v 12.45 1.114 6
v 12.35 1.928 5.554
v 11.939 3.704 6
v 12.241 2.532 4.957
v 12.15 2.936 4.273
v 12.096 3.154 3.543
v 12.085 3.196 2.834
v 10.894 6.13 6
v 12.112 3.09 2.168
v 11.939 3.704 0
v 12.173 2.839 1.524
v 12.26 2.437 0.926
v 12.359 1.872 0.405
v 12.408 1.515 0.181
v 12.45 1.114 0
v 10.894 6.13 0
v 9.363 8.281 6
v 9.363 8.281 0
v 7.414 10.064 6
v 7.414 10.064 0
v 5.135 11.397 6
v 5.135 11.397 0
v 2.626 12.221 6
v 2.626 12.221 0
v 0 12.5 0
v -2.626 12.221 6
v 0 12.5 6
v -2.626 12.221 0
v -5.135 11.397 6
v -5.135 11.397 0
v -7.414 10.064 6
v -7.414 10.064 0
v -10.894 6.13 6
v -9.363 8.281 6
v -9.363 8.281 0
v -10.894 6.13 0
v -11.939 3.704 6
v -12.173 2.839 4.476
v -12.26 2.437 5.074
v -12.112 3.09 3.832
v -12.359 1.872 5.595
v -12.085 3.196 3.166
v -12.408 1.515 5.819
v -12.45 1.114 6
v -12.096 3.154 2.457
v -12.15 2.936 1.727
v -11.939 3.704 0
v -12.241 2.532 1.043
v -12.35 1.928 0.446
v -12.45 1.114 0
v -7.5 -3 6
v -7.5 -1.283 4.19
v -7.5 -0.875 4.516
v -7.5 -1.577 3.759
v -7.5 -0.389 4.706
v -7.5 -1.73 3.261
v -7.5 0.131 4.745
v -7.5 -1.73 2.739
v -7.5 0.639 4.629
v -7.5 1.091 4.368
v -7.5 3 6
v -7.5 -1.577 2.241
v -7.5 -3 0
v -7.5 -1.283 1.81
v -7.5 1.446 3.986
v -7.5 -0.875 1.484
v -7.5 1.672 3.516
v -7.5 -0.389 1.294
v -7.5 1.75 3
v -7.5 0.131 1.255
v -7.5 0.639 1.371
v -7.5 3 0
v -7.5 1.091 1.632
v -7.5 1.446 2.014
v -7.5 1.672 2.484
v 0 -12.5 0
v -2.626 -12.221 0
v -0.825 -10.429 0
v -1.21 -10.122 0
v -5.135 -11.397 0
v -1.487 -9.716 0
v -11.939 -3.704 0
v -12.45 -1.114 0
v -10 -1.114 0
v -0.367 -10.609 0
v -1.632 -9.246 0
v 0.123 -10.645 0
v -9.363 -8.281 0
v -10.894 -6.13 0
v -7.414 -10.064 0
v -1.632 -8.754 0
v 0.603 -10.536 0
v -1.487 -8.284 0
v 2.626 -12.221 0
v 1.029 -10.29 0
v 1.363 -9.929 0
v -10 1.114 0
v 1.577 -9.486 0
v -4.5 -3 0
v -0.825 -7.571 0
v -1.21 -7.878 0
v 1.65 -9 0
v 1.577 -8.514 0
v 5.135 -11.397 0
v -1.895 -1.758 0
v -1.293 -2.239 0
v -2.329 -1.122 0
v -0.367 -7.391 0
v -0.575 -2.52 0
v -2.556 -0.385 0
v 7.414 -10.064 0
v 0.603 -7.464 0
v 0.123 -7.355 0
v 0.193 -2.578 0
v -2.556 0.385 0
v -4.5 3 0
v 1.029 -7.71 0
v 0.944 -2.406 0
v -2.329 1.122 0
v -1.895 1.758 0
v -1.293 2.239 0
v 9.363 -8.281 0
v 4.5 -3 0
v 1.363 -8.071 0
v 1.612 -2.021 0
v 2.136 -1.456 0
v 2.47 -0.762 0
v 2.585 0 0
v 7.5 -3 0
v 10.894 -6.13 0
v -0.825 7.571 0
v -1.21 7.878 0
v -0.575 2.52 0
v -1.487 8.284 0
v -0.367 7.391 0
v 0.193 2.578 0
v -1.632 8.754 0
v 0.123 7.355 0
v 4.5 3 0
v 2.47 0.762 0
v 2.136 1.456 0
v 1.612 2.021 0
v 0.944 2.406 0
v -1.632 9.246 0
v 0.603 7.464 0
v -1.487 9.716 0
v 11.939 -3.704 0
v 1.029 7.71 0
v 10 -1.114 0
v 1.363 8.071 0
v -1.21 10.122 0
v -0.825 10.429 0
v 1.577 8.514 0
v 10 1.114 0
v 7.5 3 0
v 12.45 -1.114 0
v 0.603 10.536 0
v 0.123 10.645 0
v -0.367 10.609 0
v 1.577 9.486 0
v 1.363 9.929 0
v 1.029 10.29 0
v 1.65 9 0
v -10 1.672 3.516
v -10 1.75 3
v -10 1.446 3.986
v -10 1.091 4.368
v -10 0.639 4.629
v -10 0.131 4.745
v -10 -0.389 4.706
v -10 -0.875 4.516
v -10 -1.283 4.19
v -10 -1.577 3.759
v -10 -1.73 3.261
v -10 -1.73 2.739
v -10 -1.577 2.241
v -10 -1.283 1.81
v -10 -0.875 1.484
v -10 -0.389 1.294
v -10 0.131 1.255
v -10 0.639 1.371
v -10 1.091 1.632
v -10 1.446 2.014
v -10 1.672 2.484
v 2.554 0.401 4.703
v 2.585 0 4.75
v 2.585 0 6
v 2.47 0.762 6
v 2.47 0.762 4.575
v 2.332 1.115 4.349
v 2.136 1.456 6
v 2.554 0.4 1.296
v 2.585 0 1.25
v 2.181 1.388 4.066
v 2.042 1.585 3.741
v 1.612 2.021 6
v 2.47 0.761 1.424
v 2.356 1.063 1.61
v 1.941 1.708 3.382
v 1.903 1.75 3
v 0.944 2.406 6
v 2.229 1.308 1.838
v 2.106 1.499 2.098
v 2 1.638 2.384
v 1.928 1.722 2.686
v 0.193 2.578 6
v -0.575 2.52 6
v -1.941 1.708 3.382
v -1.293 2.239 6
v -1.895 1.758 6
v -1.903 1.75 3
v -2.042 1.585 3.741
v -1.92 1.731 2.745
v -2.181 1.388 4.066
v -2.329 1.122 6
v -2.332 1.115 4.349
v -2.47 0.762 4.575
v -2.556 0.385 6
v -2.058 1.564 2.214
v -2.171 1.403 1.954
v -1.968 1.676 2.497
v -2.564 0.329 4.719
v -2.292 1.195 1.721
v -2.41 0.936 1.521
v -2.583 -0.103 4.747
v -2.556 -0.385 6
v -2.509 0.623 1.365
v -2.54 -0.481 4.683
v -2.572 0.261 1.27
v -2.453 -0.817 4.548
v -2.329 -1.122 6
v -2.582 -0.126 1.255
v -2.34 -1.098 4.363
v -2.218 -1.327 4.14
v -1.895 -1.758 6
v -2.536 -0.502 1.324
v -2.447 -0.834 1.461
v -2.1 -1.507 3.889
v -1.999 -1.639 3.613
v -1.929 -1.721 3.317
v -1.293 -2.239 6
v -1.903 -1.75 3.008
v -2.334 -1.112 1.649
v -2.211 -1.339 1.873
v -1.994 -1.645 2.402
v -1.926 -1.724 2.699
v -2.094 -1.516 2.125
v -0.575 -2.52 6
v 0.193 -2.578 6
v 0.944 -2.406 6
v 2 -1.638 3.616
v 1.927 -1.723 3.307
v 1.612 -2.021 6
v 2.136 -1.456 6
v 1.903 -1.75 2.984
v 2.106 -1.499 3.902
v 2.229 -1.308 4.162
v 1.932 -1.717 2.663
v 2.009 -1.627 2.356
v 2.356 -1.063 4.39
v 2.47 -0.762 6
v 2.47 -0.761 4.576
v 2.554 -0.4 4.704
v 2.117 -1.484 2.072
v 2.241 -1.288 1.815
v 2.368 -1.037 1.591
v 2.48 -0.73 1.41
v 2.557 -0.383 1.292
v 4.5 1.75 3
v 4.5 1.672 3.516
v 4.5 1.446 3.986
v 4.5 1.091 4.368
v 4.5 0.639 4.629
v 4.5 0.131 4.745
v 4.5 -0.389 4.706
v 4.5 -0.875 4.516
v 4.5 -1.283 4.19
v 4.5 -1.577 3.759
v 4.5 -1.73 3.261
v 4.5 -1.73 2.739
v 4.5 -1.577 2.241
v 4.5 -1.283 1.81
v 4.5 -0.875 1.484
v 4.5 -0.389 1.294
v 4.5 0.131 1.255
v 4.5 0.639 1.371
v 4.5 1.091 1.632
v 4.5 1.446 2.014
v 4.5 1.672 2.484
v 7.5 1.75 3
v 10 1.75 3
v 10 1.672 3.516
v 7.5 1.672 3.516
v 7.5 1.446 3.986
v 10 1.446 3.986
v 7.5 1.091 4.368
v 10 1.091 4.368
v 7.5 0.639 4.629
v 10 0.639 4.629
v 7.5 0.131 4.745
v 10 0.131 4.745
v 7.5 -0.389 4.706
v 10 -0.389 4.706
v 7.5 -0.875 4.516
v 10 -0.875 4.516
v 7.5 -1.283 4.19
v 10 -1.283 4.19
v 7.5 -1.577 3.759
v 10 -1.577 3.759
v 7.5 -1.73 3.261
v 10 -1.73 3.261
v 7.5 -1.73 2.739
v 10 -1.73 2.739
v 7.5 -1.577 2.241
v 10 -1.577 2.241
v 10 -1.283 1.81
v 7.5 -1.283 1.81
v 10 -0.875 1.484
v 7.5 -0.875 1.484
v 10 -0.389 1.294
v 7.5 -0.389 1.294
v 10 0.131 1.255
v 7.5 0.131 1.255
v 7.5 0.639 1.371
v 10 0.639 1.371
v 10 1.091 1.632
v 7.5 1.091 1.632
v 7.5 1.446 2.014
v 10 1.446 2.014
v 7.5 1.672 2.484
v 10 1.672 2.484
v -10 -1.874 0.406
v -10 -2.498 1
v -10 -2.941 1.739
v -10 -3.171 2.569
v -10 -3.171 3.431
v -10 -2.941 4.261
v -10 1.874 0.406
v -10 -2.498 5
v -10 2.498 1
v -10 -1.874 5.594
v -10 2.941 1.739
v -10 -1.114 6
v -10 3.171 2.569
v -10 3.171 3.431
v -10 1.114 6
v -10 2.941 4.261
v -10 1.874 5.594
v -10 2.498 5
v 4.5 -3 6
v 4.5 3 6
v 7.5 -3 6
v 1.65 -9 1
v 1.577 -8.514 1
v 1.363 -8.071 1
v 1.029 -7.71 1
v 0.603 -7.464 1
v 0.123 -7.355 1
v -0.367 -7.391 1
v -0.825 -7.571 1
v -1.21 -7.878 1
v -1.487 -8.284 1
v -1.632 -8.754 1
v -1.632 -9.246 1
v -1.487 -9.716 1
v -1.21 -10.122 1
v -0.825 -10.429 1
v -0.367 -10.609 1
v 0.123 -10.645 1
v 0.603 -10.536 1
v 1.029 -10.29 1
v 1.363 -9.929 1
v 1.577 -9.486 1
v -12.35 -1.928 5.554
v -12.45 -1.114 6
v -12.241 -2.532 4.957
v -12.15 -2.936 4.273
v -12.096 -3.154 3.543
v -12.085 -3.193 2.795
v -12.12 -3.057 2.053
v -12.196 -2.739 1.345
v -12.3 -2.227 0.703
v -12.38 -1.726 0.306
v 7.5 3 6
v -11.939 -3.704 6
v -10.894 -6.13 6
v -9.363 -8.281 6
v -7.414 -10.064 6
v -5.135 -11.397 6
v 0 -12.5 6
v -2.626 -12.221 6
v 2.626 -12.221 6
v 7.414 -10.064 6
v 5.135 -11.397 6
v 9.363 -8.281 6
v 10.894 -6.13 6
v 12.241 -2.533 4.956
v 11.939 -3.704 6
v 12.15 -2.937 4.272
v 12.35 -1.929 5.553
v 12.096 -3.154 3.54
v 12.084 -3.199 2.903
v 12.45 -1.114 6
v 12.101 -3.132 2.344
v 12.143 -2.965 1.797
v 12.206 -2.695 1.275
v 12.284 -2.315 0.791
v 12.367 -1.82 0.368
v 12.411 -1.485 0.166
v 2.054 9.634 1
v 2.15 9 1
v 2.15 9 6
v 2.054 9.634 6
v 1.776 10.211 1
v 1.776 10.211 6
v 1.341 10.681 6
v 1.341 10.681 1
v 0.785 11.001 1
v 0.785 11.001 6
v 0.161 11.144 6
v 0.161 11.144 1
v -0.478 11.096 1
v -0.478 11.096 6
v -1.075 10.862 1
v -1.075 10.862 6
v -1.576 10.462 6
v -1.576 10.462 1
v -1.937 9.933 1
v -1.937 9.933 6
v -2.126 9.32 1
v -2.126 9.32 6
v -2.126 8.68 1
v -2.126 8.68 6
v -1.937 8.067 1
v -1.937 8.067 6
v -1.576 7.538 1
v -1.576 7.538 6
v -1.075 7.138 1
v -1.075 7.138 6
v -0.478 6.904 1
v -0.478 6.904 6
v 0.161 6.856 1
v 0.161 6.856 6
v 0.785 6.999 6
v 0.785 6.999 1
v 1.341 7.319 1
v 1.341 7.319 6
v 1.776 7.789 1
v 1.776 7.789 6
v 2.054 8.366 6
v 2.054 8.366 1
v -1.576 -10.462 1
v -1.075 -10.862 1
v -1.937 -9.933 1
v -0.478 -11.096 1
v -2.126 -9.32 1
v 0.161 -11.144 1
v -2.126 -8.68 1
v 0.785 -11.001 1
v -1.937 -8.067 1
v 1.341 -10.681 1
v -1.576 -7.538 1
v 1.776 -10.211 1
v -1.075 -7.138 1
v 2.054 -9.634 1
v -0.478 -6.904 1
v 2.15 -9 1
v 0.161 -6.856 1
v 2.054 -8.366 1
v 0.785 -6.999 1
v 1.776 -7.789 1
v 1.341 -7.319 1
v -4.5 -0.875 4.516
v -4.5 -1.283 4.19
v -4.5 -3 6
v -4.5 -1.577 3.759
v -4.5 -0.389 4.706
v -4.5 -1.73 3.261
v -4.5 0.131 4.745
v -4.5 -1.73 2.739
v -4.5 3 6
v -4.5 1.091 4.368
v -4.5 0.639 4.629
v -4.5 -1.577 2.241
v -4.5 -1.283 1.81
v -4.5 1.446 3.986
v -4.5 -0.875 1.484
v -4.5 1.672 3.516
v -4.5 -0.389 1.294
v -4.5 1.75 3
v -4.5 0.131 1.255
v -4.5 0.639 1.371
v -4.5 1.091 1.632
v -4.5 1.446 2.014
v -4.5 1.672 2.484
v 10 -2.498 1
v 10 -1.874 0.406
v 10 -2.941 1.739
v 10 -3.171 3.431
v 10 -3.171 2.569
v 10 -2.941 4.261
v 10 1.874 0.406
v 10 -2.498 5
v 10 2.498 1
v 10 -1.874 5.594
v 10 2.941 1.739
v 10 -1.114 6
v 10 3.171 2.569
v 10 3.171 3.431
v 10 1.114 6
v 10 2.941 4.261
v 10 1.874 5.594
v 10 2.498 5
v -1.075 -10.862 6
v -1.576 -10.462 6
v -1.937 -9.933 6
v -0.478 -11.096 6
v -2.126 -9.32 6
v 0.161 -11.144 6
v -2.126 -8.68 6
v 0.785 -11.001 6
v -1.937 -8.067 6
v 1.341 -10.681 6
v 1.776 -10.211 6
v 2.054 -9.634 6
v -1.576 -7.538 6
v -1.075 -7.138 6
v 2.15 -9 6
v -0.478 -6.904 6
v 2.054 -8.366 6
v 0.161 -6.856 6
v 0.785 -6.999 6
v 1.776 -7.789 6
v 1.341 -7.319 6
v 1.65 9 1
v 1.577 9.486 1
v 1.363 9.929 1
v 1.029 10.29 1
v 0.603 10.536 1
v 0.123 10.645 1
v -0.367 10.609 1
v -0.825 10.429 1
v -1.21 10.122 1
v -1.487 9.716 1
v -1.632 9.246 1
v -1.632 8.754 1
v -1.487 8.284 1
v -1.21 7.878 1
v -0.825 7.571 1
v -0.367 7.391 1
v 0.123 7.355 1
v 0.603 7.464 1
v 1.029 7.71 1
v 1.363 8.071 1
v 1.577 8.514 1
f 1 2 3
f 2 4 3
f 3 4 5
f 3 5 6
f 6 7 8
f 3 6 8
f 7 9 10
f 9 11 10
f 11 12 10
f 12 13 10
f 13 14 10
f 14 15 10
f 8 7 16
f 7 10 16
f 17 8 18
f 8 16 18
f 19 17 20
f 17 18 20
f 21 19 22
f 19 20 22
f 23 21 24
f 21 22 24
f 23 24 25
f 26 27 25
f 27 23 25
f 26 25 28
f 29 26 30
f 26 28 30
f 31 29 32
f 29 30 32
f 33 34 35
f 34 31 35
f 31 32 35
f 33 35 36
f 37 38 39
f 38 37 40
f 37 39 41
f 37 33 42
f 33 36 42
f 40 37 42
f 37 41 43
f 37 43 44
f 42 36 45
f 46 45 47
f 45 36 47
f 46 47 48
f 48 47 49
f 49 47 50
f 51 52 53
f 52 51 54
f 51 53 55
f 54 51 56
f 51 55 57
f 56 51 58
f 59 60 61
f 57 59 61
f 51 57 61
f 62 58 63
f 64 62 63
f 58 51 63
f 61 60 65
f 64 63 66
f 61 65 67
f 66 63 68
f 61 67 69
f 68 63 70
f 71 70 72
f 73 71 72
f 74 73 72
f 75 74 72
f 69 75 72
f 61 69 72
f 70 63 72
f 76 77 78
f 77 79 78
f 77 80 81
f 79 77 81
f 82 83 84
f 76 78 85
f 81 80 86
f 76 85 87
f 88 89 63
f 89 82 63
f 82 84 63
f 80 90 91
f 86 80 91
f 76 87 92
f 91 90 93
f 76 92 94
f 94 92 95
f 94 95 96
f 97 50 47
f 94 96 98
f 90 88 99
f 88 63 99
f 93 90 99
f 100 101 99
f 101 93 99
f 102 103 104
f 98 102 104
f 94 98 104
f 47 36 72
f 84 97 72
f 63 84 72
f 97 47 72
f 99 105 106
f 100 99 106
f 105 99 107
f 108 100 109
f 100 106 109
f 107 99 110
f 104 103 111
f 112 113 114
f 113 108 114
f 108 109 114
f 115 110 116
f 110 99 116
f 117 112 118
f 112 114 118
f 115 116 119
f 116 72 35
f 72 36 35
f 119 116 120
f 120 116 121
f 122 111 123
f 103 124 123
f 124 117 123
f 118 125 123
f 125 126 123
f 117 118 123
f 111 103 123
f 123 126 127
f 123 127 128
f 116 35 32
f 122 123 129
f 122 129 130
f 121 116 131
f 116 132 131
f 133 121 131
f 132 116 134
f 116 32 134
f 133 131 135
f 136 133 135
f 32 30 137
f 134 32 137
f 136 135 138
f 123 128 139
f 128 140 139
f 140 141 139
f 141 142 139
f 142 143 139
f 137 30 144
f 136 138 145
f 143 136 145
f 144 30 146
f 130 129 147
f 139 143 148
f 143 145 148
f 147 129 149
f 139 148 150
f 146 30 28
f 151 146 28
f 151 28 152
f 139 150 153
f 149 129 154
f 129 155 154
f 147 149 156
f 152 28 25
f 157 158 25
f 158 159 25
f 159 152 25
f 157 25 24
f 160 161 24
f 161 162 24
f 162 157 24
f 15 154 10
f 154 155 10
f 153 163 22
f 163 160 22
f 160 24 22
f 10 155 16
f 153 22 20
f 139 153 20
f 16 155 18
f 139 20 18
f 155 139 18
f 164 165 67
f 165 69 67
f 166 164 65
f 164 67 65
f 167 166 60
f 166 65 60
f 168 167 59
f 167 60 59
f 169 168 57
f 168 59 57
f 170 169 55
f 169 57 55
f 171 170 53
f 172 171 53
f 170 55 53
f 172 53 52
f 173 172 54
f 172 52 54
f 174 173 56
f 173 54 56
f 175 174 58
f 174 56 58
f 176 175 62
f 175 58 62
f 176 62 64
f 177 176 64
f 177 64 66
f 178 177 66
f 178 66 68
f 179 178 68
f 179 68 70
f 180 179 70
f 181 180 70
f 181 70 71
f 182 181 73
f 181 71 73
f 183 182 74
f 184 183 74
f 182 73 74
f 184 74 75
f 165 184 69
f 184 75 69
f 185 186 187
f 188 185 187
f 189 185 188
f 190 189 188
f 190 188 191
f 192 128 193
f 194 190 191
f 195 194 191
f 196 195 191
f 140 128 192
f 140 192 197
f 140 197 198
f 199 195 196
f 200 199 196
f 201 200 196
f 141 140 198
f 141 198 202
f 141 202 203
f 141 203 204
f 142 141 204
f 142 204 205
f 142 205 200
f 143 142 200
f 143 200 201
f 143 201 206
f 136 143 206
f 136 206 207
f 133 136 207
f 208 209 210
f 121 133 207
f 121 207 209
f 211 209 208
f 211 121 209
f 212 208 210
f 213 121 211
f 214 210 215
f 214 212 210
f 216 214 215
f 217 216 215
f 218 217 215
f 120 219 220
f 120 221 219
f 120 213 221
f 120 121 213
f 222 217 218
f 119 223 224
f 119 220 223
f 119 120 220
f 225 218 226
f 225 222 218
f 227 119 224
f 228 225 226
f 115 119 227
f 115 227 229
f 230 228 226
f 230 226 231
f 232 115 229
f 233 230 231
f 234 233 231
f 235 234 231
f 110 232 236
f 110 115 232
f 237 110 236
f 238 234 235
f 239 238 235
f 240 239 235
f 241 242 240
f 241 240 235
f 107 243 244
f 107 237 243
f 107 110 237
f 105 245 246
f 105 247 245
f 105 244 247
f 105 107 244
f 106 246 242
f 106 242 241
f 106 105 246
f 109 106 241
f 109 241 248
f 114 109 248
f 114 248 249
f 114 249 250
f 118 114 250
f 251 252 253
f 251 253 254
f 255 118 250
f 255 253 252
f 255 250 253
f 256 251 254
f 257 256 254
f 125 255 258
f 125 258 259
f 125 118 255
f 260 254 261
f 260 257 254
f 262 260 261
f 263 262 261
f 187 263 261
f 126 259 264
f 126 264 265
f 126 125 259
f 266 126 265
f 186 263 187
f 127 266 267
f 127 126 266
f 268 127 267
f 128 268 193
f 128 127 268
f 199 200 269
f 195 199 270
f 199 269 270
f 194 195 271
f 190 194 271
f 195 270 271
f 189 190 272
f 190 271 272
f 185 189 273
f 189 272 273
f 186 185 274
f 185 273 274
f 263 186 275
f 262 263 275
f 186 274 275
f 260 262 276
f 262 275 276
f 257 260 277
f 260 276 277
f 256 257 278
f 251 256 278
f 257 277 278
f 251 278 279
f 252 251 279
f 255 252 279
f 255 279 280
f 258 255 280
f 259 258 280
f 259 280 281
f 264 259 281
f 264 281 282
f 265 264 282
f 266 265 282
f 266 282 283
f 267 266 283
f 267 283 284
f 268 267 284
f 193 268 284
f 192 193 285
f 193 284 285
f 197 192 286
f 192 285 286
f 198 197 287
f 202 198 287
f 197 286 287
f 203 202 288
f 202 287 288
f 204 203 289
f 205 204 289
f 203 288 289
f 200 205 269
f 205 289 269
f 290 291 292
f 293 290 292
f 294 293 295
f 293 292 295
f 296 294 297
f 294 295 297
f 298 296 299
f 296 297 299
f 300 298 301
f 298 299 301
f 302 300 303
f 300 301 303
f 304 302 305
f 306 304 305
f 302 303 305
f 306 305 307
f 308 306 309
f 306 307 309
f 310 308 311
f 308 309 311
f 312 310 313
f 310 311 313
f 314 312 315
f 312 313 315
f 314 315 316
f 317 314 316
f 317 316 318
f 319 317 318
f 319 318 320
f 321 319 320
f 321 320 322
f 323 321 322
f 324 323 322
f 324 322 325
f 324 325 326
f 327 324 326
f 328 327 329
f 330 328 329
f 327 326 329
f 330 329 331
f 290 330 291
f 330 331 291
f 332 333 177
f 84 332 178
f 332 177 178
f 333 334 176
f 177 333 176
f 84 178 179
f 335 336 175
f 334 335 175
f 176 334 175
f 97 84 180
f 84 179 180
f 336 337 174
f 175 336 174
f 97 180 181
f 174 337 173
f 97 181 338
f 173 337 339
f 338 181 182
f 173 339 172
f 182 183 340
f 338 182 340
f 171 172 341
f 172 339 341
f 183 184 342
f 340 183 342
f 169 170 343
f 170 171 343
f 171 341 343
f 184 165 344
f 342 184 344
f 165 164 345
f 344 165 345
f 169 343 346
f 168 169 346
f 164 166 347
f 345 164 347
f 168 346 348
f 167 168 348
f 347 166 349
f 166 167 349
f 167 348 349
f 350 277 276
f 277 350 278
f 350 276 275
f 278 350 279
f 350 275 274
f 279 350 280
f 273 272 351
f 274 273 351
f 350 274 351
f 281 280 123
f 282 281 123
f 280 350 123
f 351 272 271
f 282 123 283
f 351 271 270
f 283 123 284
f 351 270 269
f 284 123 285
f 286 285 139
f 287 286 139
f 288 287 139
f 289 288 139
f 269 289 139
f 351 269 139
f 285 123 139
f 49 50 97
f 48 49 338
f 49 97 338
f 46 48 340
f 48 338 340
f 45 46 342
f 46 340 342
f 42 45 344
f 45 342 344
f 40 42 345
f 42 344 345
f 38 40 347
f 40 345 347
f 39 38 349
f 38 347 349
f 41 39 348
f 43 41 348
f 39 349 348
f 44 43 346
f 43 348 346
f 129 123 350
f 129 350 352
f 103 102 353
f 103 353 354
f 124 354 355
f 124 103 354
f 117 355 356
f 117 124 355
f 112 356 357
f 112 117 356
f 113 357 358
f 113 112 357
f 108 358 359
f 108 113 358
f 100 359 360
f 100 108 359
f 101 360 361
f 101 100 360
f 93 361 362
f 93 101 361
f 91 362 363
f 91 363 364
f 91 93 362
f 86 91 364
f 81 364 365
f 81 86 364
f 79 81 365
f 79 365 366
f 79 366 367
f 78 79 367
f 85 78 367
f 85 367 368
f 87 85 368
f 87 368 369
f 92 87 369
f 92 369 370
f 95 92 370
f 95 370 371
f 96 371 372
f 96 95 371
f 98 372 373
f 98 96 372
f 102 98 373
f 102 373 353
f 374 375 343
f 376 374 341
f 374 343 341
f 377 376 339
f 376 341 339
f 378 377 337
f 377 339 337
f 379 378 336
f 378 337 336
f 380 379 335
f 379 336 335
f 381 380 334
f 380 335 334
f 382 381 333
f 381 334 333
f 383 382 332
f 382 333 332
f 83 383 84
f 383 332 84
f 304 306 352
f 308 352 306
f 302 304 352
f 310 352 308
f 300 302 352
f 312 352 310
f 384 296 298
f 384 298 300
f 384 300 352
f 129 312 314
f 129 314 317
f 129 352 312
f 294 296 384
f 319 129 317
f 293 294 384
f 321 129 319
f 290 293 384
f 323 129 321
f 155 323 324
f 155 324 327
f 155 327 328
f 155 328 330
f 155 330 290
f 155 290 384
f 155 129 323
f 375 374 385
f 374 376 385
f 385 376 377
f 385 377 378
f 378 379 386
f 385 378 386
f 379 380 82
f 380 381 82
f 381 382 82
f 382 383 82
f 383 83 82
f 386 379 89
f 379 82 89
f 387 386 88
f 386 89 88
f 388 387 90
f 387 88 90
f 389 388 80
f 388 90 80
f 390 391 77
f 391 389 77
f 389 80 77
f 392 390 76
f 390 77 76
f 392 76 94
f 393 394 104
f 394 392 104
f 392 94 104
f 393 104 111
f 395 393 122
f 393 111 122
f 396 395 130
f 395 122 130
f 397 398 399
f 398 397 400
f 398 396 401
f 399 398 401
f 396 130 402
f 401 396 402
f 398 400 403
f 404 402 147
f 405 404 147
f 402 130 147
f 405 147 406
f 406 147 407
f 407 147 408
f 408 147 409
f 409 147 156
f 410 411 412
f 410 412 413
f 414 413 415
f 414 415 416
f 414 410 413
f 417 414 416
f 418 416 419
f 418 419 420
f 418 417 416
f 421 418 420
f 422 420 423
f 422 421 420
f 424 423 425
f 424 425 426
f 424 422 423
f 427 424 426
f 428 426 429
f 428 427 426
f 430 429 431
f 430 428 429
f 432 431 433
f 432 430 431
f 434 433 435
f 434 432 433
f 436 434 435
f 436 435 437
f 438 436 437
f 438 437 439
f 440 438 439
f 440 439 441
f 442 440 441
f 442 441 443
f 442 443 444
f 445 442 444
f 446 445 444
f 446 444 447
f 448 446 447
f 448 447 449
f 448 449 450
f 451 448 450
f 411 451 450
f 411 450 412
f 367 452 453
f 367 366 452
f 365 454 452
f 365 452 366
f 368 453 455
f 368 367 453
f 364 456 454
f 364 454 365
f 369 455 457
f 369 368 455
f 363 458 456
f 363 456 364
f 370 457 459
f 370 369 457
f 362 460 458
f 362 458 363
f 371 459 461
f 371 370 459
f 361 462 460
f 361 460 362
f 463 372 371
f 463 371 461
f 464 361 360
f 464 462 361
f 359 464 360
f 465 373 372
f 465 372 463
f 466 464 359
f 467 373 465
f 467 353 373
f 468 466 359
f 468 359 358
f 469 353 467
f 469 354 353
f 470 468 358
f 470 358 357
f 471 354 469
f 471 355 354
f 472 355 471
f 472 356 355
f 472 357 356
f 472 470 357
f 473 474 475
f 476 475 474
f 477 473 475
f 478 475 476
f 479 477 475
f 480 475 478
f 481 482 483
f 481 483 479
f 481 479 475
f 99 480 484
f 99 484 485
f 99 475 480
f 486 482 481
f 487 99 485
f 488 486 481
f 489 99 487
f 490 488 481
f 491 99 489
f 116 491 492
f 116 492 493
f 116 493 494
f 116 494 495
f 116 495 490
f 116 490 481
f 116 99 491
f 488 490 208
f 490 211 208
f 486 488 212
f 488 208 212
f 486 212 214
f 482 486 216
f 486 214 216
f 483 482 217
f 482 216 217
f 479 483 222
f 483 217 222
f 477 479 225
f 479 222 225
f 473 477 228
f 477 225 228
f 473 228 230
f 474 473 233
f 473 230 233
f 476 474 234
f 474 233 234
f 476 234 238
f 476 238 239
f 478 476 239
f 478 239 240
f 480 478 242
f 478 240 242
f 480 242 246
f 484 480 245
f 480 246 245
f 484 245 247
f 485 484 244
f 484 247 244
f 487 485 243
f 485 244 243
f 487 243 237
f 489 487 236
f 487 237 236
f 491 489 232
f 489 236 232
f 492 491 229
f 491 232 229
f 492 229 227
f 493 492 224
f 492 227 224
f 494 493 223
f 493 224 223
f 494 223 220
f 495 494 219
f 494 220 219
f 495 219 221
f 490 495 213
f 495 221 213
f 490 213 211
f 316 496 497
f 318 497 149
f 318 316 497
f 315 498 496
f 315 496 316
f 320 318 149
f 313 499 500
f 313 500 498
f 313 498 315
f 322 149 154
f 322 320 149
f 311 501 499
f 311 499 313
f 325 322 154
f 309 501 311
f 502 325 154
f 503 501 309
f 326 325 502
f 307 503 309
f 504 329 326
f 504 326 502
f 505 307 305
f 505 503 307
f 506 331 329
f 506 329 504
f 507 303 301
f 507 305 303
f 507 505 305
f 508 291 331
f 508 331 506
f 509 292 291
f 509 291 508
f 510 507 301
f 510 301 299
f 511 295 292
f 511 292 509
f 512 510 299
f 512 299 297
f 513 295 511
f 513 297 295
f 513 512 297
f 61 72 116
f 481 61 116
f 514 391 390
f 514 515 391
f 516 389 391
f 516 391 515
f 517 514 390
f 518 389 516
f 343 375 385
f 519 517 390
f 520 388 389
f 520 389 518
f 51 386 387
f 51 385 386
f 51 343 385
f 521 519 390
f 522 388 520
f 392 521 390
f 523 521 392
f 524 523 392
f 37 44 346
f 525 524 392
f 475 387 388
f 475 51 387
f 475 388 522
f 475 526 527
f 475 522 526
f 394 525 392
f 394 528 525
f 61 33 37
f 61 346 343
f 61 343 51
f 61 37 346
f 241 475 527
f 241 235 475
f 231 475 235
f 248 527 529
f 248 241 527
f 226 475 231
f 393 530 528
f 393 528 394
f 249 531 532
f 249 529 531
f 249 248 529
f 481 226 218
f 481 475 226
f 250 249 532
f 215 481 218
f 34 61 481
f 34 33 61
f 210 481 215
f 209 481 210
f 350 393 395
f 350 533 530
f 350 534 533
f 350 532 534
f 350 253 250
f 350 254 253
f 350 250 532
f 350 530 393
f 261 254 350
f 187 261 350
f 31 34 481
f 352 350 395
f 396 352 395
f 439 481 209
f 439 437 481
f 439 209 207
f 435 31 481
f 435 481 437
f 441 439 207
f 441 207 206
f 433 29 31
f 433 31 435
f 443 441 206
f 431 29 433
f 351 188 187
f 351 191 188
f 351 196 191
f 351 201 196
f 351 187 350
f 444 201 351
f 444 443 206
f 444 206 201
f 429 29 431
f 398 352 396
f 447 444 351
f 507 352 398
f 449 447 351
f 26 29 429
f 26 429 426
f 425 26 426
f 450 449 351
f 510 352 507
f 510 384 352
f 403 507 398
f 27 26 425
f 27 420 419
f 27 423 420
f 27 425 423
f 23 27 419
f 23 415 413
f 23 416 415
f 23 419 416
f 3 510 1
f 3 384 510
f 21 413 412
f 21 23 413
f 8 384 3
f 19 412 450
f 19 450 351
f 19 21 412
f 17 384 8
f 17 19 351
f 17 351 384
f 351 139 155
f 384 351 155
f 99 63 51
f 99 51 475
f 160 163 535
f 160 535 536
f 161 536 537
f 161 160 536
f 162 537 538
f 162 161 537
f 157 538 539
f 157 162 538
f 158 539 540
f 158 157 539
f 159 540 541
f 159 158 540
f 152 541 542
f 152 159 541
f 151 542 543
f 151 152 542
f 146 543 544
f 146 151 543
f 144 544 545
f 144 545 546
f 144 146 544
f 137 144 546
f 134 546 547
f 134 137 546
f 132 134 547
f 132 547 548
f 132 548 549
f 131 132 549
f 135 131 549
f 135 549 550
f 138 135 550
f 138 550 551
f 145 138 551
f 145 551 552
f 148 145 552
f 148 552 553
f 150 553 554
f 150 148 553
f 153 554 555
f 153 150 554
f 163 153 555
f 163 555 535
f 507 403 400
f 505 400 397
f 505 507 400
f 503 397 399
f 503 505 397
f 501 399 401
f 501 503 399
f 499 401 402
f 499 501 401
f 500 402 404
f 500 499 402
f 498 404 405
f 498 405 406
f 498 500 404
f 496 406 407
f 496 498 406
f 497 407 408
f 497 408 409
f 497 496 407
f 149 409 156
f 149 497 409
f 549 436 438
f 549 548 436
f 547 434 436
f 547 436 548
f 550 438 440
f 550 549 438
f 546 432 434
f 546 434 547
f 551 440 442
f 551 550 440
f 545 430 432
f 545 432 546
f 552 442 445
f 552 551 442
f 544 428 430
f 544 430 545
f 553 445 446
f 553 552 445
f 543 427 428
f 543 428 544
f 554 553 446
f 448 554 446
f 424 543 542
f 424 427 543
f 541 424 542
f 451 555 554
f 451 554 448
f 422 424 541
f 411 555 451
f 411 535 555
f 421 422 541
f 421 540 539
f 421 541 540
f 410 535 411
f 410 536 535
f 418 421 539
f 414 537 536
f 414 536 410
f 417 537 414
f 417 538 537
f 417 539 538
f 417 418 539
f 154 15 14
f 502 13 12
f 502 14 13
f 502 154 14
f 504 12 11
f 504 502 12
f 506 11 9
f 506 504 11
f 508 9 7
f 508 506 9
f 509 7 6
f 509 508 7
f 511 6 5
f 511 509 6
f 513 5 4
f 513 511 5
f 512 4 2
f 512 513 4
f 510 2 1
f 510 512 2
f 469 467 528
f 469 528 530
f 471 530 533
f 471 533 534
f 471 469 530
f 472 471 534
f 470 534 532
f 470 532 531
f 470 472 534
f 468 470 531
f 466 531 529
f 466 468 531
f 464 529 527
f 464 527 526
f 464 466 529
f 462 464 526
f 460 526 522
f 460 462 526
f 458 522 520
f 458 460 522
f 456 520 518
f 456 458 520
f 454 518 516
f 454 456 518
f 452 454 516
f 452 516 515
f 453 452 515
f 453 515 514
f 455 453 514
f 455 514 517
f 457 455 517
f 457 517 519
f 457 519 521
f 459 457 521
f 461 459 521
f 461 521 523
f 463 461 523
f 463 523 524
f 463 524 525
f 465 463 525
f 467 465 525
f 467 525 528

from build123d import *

# Parameters (mm, degrees)
F0_R     = 12.5
F0_R_2   = 2.15
F0_W     = 3
F0_H     = 6
F0_R_3   = 2.585
F1_DEPTH = 6
F0_R_4   = 1.65
F2_DEPTH = 1
F3_R     = 1.75
F4_DEPTH = 12.5
F5_START = -10
F3_R_2   = 3.2
F5_DEPTH = 15
F6_START = 10
F6_DEPTH = 15


with BuildPart() as f1:
    # F0 (on Top) → F1 (new body)
    with BuildSketch(Plane.XY):
        Circle(F0_R)
        with Locations((0, -9)):
            Circle(F0_R_2, mode=Mode.SUBTRACT)
        with Locations((-6, 0)):
            Rectangle(F0_W, F0_H, mode=Mode.SUBTRACT)
        Circle(F0_R_3, mode=Mode.SUBTRACT)
        with Locations((6, 0)):
            Rectangle(F0_W, F0_H, mode=Mode.SUBTRACT)
        with Locations((0, 9)):
            Circle(F0_R_2, mode=Mode.SUBTRACT)
        Circle(F0_R)
        with Locations((0, -9)):
            Circle(F0_R_2, mode=Mode.SUBTRACT)
        with Locations((-6, 0)):
            Rectangle(F0_W, F0_H, mode=Mode.SUBTRACT)
        Circle(F0_R_3, mode=Mode.SUBTRACT)
        with Locations((6, 0)):
            Rectangle(F0_W, F0_H, mode=Mode.SUBTRACT)
        with Locations((0, 9)):
            Circle(F0_R_2, mode=Mode.SUBTRACT)
    extrude(amount=F1_DEPTH)

    # F0 (on Top) → F2 (join)
    with BuildSketch(Plane.XY):
        with Locations((0, 9)):
            Circle(F0_R_2)
        with Locations((0, 9)):
            Circle(F0_R_4, mode=Mode.SUBTRACT)
        with Locations((0, -9)):
            Circle(F0_R_2)
        with Locations((0, -9)):
            Circle(F0_R_4, mode=Mode.SUBTRACT)
    extrude(amount=F2_DEPTH)

    # F3 (on Right) → F4 (cut, symmetric)
    with BuildSketch(Plane.YZ):
        with Locations((0, 3)):
            Circle(F3_R)
    extrude(amount=F4_DEPTH, both=True, mode=Mode.SUBTRACT)

    # F3 (on Right) → F5 (cut)
    with BuildSketch(Plane.YZ.offset(F5_START)):
        with Locations((0, 3)):
            Circle(F3_R_2)
        with Locations((0, 3)):
            Circle(F3_R, mode=Mode.SUBTRACT)
    extrude(amount=-F5_DEPTH, mode=Mode.SUBTRACT)

    # F3 (on Right) → F6 (cut)
    with BuildSketch(Plane.YZ.offset(F6_START)):
        with Locations((0, 3)):
            Circle(F3_R_2)
        with Locations((0, 3)):
            Circle(F3_R, mode=Mode.SUBTRACT)
    extrude(amount=F6_DEPTH, mode=Mode.SUBTRACT)


solid = f1.part
